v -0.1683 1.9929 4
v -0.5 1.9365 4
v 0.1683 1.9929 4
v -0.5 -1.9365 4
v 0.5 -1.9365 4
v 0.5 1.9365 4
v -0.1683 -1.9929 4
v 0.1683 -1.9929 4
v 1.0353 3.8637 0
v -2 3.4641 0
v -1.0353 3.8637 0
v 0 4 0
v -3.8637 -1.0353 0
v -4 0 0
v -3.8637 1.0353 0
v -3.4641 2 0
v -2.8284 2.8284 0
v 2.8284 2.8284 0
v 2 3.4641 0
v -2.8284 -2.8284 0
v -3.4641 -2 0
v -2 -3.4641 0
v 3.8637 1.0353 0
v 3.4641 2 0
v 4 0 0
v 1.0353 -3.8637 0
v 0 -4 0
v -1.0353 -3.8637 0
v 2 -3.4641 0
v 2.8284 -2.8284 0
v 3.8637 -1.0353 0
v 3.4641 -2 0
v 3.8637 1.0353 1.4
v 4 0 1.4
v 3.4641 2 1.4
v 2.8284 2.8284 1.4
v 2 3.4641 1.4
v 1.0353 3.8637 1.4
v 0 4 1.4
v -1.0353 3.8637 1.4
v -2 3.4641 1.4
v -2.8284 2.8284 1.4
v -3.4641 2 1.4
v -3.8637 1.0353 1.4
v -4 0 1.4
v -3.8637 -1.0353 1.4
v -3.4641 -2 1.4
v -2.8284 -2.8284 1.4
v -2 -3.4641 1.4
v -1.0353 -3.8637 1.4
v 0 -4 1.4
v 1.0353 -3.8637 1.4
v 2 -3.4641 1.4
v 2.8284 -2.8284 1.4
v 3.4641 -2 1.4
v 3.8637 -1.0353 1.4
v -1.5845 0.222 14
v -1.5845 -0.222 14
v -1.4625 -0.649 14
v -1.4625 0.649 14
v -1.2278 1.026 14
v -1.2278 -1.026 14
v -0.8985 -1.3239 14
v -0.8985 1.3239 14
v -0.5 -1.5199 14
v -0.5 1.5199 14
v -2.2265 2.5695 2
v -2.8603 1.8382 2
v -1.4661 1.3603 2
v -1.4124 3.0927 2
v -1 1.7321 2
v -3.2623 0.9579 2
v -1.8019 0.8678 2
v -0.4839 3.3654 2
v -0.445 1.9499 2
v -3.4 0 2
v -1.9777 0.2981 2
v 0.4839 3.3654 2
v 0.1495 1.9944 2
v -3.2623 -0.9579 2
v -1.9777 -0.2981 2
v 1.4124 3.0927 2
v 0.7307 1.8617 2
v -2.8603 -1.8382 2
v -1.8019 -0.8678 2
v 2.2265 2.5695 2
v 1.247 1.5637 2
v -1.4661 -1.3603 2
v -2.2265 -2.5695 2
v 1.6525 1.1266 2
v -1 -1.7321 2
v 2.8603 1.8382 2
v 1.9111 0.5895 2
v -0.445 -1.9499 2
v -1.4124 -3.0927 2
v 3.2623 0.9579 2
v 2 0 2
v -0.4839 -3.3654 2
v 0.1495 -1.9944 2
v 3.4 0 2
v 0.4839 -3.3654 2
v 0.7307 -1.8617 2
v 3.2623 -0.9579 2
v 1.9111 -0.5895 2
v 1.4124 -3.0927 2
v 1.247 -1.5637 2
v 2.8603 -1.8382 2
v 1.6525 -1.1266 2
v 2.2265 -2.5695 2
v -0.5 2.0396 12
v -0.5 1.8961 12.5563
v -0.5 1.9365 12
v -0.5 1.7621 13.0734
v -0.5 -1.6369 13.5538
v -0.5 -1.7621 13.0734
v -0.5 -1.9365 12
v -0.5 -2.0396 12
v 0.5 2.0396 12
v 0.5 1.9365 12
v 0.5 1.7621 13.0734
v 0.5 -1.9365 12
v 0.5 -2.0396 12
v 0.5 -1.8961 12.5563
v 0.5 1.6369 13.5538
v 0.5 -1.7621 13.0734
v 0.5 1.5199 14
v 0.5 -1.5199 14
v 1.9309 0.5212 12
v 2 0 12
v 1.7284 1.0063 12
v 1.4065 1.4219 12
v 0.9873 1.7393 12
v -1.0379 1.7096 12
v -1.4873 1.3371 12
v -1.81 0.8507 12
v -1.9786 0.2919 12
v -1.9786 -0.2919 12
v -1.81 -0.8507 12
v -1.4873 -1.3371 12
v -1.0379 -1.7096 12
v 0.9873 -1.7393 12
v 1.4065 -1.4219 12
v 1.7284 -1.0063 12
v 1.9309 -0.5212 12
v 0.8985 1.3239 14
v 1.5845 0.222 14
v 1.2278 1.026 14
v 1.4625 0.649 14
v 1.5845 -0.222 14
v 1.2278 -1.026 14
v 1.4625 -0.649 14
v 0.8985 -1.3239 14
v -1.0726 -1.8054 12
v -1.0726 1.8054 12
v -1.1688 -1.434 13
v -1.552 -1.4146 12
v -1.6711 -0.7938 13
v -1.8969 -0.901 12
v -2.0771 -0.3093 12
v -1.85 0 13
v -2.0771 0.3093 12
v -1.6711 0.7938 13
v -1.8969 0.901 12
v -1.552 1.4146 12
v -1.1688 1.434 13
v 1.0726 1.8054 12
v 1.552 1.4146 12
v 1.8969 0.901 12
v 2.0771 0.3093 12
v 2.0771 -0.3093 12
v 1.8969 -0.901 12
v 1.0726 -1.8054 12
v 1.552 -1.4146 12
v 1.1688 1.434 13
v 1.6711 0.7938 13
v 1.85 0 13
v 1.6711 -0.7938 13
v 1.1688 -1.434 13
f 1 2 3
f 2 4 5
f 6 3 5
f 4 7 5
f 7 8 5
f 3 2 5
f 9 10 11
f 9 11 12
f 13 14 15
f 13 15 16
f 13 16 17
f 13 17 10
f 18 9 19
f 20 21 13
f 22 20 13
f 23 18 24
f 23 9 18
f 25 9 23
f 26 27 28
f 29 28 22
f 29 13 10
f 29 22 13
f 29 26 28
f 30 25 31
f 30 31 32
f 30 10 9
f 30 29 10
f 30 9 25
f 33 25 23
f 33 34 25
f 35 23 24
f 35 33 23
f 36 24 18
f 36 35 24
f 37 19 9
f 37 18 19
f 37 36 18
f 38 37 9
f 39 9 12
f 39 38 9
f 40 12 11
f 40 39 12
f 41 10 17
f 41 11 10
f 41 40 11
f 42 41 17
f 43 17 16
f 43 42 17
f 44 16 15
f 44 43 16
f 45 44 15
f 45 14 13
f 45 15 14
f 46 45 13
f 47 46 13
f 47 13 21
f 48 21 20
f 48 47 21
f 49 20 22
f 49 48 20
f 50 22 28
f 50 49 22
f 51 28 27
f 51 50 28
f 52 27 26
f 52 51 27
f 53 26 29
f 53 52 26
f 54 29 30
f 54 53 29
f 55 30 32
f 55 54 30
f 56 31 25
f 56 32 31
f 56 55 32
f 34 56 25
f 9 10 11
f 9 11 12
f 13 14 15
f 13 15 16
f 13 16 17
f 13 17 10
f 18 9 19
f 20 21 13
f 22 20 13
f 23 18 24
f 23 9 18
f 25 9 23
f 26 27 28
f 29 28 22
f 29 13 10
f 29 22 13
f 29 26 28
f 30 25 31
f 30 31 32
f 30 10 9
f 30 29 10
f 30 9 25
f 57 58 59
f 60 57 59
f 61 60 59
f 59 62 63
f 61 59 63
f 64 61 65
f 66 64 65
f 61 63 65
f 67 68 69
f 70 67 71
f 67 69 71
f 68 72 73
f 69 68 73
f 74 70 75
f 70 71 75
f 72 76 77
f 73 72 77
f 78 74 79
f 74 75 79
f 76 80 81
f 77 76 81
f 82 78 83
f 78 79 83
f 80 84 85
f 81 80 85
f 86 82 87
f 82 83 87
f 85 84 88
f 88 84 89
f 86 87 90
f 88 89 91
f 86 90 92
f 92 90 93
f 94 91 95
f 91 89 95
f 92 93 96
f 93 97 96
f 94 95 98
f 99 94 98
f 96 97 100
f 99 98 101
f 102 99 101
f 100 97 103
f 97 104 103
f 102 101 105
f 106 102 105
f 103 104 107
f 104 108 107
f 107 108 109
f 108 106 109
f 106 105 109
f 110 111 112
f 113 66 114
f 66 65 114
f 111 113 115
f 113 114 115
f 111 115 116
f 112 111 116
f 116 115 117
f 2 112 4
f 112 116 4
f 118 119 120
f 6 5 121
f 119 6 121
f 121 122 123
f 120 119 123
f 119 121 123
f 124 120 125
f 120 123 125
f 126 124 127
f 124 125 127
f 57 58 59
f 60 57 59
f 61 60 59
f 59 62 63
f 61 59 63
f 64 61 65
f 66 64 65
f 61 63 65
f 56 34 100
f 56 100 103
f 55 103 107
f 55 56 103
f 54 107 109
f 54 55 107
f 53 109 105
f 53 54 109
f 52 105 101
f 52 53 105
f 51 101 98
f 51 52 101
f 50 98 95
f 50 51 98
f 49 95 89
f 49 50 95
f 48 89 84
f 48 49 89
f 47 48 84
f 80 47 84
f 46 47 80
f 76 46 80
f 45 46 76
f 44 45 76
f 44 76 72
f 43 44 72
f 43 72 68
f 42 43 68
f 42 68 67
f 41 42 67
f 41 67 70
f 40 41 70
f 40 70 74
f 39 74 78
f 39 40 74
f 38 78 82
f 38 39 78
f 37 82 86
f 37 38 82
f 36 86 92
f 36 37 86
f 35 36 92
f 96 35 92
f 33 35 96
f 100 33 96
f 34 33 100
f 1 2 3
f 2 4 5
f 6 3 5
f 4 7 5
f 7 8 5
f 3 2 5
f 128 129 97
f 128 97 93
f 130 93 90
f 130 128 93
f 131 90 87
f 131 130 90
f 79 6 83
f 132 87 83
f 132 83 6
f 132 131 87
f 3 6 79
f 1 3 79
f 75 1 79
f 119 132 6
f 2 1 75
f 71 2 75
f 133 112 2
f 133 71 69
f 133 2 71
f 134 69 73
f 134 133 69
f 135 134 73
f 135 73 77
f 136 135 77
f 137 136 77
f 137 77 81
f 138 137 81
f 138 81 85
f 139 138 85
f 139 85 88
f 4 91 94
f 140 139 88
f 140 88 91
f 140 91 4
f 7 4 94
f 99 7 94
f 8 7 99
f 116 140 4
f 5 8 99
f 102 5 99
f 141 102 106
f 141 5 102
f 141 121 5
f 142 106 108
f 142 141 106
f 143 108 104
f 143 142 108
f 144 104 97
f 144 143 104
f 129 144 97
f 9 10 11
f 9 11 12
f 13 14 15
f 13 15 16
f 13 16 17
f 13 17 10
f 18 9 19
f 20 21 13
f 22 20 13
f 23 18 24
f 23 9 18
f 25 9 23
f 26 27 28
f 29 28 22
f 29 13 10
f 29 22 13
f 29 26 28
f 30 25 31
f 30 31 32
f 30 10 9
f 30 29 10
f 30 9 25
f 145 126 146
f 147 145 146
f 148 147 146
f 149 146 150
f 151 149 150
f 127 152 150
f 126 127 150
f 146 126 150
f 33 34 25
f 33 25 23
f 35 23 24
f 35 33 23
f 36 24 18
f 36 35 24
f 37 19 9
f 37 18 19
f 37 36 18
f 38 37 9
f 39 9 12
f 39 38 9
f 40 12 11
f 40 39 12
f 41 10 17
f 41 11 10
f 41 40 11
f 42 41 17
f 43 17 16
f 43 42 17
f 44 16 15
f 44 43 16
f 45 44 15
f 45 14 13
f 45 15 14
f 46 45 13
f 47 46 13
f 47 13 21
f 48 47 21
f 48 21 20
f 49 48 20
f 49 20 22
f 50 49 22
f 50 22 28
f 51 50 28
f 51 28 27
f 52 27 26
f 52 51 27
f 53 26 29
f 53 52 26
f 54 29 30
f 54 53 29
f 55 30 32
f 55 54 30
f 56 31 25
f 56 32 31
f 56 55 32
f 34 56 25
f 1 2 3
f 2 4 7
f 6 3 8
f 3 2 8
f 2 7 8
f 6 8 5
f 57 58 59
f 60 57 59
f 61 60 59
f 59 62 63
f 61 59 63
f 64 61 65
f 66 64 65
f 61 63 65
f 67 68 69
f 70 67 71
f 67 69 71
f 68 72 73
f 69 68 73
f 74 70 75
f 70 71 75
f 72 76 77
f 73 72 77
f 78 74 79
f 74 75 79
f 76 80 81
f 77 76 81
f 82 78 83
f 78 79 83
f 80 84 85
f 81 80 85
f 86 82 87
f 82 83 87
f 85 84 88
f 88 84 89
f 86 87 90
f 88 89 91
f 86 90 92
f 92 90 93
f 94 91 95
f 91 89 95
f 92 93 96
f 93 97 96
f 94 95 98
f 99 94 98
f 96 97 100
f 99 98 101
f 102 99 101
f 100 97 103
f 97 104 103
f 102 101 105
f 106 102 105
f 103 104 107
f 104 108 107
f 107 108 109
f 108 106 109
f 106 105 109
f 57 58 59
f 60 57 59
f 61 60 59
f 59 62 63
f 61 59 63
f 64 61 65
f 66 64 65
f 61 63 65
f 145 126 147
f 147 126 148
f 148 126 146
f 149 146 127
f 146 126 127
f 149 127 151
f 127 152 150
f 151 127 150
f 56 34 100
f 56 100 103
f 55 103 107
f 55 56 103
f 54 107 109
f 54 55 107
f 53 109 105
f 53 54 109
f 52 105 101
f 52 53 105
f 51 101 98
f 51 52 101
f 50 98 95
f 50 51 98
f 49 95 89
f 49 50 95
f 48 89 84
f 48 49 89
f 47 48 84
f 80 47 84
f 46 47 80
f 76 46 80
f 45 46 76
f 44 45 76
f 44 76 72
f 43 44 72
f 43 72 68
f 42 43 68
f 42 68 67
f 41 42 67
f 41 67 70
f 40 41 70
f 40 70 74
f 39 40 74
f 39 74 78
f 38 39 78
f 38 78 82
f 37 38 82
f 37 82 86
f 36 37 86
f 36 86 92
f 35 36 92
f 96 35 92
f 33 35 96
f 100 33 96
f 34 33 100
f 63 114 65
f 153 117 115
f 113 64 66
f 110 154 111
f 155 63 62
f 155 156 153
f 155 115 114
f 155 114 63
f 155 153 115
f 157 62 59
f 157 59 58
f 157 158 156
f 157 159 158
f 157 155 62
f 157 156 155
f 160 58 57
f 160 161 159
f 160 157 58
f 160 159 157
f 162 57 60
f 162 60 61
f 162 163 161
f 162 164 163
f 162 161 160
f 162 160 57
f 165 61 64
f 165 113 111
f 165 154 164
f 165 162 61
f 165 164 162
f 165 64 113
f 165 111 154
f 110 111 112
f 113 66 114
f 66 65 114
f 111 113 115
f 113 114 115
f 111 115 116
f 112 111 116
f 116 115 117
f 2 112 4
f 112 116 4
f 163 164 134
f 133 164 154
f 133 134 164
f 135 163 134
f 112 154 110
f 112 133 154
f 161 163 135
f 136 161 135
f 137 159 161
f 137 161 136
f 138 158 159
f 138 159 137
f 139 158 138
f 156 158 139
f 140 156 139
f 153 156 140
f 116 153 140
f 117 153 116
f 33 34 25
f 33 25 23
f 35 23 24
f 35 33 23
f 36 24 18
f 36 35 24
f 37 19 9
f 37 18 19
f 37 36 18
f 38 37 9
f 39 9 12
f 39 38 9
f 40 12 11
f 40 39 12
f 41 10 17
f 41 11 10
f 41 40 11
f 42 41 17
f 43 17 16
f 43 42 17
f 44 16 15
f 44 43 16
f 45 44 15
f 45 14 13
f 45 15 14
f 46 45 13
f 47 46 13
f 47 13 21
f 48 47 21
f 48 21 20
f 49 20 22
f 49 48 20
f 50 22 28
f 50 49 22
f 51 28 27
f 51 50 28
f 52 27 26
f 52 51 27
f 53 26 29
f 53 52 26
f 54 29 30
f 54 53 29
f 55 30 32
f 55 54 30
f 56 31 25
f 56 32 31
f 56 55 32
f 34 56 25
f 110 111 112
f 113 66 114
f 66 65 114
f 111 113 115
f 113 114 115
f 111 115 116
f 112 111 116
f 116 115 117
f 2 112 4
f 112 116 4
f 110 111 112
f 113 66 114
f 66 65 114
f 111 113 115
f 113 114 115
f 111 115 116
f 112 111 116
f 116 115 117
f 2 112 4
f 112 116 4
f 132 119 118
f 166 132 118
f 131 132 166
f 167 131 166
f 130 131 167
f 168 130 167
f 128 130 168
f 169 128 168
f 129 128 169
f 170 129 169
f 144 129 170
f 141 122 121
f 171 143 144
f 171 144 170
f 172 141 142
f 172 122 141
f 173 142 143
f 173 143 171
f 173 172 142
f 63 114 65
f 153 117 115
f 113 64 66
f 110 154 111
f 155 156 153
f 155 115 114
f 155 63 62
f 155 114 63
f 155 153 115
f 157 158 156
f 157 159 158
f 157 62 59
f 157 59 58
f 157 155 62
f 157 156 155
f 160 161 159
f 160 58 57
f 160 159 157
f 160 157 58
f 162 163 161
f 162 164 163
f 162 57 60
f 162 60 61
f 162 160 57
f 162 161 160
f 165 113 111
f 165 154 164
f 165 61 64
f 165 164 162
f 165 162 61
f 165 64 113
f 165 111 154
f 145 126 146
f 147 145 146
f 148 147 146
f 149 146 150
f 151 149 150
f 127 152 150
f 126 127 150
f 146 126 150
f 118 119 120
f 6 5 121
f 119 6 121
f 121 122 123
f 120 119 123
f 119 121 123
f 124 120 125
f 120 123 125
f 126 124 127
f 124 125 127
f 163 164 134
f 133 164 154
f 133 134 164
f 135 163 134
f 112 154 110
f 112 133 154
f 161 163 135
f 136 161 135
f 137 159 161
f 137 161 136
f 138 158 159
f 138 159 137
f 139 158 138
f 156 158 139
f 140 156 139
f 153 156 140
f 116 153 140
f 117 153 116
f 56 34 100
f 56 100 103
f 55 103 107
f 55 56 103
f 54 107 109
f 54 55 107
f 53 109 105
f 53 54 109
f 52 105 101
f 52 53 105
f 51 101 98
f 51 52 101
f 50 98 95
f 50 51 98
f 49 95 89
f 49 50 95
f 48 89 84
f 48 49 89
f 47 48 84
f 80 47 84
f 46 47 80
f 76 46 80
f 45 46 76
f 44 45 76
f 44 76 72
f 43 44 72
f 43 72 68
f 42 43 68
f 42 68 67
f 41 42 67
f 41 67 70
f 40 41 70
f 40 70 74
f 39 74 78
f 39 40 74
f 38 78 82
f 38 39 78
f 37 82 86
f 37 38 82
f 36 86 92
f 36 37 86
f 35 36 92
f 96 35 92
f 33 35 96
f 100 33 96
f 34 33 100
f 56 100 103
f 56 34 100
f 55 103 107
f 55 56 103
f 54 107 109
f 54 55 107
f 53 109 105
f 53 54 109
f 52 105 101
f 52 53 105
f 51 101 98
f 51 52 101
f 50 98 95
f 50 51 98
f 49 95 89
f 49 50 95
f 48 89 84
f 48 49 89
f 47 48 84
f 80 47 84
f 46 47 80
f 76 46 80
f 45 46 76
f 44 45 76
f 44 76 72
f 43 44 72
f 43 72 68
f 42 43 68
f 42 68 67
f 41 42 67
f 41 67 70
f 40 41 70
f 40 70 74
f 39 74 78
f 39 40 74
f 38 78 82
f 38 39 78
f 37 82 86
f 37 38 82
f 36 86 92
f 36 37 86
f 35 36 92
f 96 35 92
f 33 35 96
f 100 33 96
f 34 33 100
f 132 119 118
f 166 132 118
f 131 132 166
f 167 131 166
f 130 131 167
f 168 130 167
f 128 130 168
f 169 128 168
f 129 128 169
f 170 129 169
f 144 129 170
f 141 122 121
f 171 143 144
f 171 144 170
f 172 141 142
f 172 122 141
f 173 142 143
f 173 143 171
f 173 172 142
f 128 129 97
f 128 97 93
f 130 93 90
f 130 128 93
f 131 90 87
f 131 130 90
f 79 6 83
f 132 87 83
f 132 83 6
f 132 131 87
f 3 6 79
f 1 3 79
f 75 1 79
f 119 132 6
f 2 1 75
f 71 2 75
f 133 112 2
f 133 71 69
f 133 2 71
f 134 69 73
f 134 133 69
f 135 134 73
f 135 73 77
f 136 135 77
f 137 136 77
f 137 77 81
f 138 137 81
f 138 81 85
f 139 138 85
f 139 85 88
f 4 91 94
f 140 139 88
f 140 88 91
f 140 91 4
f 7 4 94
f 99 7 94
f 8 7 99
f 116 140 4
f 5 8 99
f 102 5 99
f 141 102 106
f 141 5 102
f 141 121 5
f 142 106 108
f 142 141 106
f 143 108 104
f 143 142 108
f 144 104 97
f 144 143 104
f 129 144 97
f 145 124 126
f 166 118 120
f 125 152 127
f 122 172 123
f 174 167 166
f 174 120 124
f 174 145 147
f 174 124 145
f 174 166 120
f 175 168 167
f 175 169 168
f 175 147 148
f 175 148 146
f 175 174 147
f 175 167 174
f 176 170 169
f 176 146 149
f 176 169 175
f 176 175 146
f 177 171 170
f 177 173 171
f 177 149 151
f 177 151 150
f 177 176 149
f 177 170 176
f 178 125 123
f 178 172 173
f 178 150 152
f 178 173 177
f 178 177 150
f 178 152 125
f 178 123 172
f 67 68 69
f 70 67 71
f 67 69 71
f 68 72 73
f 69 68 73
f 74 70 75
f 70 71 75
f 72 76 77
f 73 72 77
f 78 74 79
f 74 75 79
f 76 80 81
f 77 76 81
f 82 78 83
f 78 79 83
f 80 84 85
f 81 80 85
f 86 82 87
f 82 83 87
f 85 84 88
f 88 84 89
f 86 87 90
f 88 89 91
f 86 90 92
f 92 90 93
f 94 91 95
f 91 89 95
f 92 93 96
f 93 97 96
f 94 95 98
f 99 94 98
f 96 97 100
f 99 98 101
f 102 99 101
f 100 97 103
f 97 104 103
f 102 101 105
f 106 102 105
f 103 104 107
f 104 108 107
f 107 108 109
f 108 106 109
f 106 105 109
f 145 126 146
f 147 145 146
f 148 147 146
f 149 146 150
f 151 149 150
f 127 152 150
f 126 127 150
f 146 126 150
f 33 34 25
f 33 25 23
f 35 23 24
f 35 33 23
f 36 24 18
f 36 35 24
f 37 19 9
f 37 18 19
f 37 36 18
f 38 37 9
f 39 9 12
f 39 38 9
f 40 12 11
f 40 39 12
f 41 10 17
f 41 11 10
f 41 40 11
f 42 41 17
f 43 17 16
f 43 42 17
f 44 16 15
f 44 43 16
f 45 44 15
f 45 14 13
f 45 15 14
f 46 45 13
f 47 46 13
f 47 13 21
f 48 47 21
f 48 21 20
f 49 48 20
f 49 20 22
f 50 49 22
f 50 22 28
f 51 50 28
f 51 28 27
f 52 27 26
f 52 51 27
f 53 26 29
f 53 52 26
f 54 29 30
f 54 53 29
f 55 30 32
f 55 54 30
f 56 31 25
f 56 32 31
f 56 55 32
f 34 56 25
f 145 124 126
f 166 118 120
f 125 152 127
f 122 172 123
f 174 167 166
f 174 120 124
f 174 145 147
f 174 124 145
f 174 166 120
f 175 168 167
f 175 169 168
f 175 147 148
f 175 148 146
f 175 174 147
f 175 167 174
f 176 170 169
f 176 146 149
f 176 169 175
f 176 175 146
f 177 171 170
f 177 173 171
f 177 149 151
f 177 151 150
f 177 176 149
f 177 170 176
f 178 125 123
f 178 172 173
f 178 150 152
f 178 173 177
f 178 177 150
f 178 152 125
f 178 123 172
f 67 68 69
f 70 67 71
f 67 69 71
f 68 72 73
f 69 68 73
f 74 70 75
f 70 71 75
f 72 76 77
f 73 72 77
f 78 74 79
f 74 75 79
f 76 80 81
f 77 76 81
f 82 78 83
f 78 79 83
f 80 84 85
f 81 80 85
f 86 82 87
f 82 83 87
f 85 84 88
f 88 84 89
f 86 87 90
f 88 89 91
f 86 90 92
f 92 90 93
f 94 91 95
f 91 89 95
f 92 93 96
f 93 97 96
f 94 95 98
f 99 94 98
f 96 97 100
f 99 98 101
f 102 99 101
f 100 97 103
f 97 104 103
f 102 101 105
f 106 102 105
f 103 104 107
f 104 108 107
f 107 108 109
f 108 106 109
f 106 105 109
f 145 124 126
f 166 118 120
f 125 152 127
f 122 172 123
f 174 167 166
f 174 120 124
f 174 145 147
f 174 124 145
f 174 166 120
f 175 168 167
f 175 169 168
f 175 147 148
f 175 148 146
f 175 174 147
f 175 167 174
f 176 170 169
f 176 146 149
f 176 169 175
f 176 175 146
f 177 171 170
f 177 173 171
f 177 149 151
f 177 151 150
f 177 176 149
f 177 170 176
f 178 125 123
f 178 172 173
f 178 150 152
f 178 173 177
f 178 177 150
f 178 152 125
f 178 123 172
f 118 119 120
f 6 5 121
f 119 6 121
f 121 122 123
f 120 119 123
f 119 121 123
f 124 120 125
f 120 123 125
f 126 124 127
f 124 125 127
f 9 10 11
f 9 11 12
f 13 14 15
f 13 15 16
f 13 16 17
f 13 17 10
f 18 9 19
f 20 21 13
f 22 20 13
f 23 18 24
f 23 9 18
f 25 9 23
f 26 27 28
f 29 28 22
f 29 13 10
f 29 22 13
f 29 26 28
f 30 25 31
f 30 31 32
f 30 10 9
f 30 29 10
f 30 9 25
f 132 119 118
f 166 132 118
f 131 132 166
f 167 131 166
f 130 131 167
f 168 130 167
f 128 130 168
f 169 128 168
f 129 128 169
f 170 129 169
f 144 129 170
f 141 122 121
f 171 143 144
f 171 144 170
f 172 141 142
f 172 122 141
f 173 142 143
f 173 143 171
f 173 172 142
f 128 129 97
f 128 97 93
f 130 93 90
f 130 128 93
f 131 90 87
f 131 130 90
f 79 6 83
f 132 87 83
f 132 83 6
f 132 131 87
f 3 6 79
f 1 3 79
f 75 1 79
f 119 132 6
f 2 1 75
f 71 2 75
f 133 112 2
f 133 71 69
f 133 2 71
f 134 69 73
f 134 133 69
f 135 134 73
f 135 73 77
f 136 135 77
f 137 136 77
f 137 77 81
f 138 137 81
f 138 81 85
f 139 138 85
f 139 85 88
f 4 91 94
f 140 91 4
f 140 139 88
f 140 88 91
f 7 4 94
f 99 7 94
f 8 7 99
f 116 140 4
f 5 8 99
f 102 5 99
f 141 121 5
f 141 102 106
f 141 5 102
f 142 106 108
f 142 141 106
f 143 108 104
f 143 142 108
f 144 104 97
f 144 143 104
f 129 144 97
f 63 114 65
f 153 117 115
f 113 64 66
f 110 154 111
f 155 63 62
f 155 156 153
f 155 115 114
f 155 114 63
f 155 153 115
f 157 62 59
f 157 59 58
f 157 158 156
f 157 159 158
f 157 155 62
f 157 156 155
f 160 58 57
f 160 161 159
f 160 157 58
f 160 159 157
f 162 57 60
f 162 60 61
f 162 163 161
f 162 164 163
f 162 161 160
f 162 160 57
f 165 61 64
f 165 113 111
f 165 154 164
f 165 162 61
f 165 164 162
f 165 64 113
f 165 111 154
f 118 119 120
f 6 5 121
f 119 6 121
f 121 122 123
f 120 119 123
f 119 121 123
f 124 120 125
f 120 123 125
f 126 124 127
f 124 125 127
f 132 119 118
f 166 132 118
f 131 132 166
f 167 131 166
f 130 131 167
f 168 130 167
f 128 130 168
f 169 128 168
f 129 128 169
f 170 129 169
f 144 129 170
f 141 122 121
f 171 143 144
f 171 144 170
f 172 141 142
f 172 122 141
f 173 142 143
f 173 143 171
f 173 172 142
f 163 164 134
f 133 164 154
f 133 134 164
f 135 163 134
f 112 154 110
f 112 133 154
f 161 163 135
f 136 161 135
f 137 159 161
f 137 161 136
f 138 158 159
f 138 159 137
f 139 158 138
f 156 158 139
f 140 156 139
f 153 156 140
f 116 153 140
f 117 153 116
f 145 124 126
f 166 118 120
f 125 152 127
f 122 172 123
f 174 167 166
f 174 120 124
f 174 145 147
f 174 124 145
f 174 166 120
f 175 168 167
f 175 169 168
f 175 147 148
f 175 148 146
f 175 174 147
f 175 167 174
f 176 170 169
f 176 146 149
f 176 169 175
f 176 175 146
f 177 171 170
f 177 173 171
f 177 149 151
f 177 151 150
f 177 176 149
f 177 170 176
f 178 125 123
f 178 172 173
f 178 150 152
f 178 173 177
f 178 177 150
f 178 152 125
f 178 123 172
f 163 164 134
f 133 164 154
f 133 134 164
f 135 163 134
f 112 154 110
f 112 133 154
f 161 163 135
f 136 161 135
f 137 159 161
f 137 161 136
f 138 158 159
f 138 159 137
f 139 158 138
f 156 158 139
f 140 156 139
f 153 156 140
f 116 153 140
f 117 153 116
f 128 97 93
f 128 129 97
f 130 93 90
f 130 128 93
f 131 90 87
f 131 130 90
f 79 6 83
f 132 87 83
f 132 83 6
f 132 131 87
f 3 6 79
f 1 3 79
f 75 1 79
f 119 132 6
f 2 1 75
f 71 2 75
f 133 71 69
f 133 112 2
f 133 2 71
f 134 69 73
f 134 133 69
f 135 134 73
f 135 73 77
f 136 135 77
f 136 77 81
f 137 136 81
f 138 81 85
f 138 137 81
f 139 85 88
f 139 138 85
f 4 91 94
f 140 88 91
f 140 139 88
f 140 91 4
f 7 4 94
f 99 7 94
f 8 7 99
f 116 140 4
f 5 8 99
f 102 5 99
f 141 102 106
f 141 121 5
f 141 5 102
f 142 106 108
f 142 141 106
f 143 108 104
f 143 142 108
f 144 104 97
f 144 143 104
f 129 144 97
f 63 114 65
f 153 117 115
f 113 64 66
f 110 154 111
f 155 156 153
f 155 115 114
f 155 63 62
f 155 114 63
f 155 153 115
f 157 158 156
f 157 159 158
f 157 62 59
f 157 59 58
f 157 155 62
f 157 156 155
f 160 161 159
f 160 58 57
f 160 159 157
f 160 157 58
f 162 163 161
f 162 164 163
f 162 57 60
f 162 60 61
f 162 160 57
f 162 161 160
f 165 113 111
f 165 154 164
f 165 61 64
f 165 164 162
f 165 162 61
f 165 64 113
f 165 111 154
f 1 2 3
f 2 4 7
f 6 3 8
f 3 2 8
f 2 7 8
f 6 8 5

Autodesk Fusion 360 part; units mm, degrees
sketch "Pin - dimensioned axial profile" plane through (0, 0, 0) normal (0, 1, 0) x (1, 0, 0) in component "Push pin - native"
  line L0 (0, 0) -> (4, 0)
  line L1 (4, 0) -> (4, -1.4)
  line L2 (4, -1.4) -> (3.4, -2)
  line L3 (3.4, -2) -> (2, -2)
  line L4 (2, -2) -> (2, -12)
  line L5 (2, -12) -> (2.1, -12)
  line L6 (2.1, -12) -> (1.6, -14)
  line L7 (1.6, -14) -> (0, -14)
  line L8 (0, -14) -> (0, 0)
  dimension "d12" = 4
  dimension "d13" = 1.4
  dimension "d14" = 0.8485
  dimension "d15" = 1.4
  dimension "d16" = 10
  dimension "d17" = 0.1
  dimension "d18" = 2.0616
  dimension "d19" = 1.6
  dimension "d20" = 14
revolve "Pin - full revolve" add sketch "Pin - dimensioned axial profile" angle 360 about axis through (0, 0, 14) along (0, 0, -1) in component "Push pin - native"
sketch "Pin - split profile" plane through (0, 0, 0) normal (0, 1, 0) x (1, 0, 0) in component "Push pin - native"
  line L0 (-0.5, -4) -> (0.5, -4)
  line L1 (0.5, -4) -> (0.5, -14.1)
  line L2 (0.5, -14.1) -> (-0.5, -14.1)
  line L3 (-0.5, -14.1) -> (-0.5, -4)
  dimension "d22" = 1
  dimension "d23" = 10.1
extrude "Pin - symmetric split cut" cut sketch "Pin - split profile" along normal mid plane 6 in component "Push pin - native"
component "Push pin - native" placed x (1, 0, 0) y (0, 1, 0) z (0, 0, 1) at (0, 0, 0)
component "Push pin - native" placed x (1, 0, 0) y (0, 1, 0) z (0, 0, 1) at (0, 0, 0)
component "Push pin - native" placed x (1, 0, 0) y (0, 1, 0) z (0, 0, 1) at (0, 0, 0)
component "Push pin - native" placed x (1, 0, 0) y (0, 1, 0) z (0, 0, 1) at (0, 0, 0)
equation "pinHeadRadius = 4 mm"
equation "pinHeadHeight = 2 mm"
equation "pinHeadChamfer = 0.6 mm"
equation "pinShaftDiameter = 4 mm"
equation "pinShaftLength = 10 mm"
equation "pinCrownDiameter = 4.2 mm"
equation "pinCrownHeight = 2 mm"
equation "pinTipRadius = 1.6 mm"
equation "pinSplitWidth = 1 mm"
equation "pinSplitRoot = 4 mm"
equation "pinSplitOverrun = 0.1 mm"
equation "d12 = pinHeadRadius"
equation "d13 = pinHeadHeight - pinHeadChamfer"
equation "d14 = sqrt(2) * pinHeadChamfer"
equation "d15 = pinHeadRadius - pinHeadChamfer - pinShaftDiameter / 2"
equation "d16 = pinShaftLength"
equation "d17 = ( pinCrownDiameter - pinShaftDiameter ) / 2"
equation "d18 = sqrt(( pinCrownDiameter / 2 - pinTipRadius ) ^ 2 + pinCrownHeight ^ 2)"
equation "d19 = pinTipRadius"
equation "d20 = pinHeadHeight + pinShaftLength + pinCrownHeight"
equation "d22 = pinSplitWidth"
equation "d23 = pinHeadHeight + pinShaftLength + pinCrownHeight + pinSplitOverrun - pinSplitRoot"
